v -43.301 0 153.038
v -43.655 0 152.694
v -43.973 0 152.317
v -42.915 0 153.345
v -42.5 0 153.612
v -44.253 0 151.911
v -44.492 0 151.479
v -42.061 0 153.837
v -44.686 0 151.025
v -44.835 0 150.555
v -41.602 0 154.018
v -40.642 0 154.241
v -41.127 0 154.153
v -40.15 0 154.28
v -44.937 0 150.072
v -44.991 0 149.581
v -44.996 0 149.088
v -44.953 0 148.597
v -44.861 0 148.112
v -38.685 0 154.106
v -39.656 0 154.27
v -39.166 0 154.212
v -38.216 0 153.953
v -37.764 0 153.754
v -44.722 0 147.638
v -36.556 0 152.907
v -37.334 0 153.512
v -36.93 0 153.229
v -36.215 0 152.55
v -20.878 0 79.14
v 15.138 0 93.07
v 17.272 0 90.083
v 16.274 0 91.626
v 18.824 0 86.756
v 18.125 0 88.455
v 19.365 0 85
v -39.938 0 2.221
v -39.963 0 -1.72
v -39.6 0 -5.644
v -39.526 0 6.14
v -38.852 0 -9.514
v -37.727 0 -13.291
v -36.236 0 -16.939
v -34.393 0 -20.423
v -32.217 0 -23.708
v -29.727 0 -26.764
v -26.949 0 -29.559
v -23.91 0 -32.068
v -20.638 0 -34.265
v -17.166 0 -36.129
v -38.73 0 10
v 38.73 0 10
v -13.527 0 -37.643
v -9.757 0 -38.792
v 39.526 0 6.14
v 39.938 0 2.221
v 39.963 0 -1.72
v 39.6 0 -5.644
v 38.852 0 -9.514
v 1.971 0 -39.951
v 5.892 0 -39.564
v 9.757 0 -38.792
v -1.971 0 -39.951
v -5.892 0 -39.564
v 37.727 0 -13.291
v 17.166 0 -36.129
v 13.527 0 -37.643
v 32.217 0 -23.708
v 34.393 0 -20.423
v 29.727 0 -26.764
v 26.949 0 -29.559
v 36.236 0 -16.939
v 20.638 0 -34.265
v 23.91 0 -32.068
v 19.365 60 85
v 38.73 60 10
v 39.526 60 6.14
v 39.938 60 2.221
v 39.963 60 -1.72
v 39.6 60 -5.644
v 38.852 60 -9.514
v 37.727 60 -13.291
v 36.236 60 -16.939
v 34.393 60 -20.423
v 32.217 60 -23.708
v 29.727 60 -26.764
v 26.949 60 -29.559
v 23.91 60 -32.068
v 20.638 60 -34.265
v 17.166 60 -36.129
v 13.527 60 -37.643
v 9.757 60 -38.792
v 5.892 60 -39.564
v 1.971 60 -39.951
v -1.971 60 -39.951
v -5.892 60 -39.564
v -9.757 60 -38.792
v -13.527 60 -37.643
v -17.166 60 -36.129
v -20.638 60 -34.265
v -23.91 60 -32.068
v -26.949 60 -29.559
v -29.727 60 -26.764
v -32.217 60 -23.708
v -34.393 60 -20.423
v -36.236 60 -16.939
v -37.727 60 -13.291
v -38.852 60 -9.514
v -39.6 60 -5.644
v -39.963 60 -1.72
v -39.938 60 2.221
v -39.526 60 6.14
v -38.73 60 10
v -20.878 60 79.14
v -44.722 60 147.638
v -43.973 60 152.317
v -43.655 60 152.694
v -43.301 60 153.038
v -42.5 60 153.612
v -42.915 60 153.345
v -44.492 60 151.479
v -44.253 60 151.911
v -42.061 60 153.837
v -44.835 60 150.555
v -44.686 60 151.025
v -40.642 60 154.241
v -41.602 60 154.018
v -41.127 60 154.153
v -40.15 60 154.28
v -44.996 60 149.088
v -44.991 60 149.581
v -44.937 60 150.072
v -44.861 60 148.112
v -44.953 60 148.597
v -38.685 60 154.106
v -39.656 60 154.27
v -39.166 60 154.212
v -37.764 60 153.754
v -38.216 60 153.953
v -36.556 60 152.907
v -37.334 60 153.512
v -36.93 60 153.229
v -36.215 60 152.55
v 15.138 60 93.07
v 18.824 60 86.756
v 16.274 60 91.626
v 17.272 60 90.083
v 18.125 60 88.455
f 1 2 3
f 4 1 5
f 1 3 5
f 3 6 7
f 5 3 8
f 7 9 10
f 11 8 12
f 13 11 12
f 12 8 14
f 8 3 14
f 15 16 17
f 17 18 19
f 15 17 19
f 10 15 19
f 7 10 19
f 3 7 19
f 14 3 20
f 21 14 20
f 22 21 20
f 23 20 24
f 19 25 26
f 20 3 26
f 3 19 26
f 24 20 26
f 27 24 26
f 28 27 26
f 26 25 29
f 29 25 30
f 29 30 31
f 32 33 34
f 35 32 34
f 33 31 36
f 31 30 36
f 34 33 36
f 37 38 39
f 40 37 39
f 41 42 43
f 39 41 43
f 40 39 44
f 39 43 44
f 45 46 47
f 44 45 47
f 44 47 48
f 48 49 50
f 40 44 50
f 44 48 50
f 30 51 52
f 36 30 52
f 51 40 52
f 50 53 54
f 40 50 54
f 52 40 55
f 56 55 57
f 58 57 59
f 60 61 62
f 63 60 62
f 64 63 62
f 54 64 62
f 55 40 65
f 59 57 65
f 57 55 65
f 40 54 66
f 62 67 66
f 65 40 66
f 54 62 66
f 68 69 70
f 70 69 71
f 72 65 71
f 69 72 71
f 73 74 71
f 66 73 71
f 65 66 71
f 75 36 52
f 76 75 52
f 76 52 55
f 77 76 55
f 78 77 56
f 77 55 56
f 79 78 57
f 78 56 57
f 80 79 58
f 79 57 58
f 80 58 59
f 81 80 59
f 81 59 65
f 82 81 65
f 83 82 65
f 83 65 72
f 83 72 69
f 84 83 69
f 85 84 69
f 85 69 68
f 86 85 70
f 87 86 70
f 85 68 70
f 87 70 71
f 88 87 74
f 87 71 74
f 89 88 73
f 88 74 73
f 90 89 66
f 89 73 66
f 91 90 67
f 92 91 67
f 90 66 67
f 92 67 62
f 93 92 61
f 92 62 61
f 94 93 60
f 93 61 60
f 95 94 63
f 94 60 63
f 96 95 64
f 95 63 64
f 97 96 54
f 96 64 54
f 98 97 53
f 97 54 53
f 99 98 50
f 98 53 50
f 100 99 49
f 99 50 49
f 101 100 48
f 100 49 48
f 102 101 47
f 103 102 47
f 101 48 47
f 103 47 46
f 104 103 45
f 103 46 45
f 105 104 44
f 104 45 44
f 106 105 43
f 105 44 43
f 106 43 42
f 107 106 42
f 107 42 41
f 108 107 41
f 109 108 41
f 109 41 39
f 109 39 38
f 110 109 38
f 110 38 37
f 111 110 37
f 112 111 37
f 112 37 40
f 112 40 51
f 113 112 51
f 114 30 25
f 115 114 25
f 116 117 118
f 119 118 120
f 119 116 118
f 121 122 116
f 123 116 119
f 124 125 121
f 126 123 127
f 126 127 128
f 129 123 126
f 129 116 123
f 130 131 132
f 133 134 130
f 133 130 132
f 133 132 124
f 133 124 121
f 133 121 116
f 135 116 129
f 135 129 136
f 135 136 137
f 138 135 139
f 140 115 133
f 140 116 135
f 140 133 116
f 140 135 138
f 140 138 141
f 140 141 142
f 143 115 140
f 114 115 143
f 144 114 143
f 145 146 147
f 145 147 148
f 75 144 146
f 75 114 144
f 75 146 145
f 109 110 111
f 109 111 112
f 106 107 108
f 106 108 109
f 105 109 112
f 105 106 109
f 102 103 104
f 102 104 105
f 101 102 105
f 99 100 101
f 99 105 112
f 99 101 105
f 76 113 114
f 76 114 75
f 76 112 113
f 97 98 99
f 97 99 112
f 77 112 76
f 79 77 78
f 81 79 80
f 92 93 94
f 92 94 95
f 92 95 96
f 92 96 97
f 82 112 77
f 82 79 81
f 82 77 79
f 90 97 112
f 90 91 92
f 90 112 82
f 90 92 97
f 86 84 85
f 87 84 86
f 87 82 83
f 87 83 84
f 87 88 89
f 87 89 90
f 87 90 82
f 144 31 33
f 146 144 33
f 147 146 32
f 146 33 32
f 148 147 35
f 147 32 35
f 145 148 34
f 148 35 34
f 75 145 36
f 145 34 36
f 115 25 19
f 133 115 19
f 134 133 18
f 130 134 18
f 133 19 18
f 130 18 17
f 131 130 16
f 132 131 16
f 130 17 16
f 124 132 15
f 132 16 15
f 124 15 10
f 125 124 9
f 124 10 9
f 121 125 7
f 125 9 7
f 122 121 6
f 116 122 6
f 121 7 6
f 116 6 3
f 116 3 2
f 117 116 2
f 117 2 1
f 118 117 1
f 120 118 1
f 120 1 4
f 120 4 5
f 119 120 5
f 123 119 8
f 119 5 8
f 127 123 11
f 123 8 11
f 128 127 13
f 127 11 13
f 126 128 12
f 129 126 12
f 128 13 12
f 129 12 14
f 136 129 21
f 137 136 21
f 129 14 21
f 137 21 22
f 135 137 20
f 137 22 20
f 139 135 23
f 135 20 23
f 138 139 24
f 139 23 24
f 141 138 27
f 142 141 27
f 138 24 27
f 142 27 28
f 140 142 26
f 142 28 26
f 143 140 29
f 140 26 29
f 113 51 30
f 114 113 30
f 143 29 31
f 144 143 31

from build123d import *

# Parameters (mm, degrees)
BOSS_EXTRUDE1_DEPTH = 60


with BuildPart() as part:
    # Sketch1 → Boss-Extrude1 (new body)
    with BuildSketch(Plane(origin=(0, 0, 0), x_dir=(1, 0, 0), z_dir=(0, 1, 0))):
        with BuildLine():
            Line((-38.729833462, -10), (-20.877867157, -79.140368196))
            Line((-20.877867157, -79.140368196), (-44.722080497, -147.638269612))
            ThreePointArc((-44.722080497, -147.638269612), (-42.5, -153.612159322), (-36.215419503, -152.549592626))
            Line((-36.215419503, -152.549592626), (15.138321986, -93.070241293))
            ThreePointArc((15.138321986, -93.070241293), (17.71723932, -89.278977901), (19.364916731, -85))
            Line((19.364916731, -85), (38.729833462, -10))
            ThreePointArc((38.729833462, -10), (0, 40), (-38.729833462, -10))
        make_face()
    extrude(amount=BOSS_EXTRUDE1_DEPTH)


solid = part.part
